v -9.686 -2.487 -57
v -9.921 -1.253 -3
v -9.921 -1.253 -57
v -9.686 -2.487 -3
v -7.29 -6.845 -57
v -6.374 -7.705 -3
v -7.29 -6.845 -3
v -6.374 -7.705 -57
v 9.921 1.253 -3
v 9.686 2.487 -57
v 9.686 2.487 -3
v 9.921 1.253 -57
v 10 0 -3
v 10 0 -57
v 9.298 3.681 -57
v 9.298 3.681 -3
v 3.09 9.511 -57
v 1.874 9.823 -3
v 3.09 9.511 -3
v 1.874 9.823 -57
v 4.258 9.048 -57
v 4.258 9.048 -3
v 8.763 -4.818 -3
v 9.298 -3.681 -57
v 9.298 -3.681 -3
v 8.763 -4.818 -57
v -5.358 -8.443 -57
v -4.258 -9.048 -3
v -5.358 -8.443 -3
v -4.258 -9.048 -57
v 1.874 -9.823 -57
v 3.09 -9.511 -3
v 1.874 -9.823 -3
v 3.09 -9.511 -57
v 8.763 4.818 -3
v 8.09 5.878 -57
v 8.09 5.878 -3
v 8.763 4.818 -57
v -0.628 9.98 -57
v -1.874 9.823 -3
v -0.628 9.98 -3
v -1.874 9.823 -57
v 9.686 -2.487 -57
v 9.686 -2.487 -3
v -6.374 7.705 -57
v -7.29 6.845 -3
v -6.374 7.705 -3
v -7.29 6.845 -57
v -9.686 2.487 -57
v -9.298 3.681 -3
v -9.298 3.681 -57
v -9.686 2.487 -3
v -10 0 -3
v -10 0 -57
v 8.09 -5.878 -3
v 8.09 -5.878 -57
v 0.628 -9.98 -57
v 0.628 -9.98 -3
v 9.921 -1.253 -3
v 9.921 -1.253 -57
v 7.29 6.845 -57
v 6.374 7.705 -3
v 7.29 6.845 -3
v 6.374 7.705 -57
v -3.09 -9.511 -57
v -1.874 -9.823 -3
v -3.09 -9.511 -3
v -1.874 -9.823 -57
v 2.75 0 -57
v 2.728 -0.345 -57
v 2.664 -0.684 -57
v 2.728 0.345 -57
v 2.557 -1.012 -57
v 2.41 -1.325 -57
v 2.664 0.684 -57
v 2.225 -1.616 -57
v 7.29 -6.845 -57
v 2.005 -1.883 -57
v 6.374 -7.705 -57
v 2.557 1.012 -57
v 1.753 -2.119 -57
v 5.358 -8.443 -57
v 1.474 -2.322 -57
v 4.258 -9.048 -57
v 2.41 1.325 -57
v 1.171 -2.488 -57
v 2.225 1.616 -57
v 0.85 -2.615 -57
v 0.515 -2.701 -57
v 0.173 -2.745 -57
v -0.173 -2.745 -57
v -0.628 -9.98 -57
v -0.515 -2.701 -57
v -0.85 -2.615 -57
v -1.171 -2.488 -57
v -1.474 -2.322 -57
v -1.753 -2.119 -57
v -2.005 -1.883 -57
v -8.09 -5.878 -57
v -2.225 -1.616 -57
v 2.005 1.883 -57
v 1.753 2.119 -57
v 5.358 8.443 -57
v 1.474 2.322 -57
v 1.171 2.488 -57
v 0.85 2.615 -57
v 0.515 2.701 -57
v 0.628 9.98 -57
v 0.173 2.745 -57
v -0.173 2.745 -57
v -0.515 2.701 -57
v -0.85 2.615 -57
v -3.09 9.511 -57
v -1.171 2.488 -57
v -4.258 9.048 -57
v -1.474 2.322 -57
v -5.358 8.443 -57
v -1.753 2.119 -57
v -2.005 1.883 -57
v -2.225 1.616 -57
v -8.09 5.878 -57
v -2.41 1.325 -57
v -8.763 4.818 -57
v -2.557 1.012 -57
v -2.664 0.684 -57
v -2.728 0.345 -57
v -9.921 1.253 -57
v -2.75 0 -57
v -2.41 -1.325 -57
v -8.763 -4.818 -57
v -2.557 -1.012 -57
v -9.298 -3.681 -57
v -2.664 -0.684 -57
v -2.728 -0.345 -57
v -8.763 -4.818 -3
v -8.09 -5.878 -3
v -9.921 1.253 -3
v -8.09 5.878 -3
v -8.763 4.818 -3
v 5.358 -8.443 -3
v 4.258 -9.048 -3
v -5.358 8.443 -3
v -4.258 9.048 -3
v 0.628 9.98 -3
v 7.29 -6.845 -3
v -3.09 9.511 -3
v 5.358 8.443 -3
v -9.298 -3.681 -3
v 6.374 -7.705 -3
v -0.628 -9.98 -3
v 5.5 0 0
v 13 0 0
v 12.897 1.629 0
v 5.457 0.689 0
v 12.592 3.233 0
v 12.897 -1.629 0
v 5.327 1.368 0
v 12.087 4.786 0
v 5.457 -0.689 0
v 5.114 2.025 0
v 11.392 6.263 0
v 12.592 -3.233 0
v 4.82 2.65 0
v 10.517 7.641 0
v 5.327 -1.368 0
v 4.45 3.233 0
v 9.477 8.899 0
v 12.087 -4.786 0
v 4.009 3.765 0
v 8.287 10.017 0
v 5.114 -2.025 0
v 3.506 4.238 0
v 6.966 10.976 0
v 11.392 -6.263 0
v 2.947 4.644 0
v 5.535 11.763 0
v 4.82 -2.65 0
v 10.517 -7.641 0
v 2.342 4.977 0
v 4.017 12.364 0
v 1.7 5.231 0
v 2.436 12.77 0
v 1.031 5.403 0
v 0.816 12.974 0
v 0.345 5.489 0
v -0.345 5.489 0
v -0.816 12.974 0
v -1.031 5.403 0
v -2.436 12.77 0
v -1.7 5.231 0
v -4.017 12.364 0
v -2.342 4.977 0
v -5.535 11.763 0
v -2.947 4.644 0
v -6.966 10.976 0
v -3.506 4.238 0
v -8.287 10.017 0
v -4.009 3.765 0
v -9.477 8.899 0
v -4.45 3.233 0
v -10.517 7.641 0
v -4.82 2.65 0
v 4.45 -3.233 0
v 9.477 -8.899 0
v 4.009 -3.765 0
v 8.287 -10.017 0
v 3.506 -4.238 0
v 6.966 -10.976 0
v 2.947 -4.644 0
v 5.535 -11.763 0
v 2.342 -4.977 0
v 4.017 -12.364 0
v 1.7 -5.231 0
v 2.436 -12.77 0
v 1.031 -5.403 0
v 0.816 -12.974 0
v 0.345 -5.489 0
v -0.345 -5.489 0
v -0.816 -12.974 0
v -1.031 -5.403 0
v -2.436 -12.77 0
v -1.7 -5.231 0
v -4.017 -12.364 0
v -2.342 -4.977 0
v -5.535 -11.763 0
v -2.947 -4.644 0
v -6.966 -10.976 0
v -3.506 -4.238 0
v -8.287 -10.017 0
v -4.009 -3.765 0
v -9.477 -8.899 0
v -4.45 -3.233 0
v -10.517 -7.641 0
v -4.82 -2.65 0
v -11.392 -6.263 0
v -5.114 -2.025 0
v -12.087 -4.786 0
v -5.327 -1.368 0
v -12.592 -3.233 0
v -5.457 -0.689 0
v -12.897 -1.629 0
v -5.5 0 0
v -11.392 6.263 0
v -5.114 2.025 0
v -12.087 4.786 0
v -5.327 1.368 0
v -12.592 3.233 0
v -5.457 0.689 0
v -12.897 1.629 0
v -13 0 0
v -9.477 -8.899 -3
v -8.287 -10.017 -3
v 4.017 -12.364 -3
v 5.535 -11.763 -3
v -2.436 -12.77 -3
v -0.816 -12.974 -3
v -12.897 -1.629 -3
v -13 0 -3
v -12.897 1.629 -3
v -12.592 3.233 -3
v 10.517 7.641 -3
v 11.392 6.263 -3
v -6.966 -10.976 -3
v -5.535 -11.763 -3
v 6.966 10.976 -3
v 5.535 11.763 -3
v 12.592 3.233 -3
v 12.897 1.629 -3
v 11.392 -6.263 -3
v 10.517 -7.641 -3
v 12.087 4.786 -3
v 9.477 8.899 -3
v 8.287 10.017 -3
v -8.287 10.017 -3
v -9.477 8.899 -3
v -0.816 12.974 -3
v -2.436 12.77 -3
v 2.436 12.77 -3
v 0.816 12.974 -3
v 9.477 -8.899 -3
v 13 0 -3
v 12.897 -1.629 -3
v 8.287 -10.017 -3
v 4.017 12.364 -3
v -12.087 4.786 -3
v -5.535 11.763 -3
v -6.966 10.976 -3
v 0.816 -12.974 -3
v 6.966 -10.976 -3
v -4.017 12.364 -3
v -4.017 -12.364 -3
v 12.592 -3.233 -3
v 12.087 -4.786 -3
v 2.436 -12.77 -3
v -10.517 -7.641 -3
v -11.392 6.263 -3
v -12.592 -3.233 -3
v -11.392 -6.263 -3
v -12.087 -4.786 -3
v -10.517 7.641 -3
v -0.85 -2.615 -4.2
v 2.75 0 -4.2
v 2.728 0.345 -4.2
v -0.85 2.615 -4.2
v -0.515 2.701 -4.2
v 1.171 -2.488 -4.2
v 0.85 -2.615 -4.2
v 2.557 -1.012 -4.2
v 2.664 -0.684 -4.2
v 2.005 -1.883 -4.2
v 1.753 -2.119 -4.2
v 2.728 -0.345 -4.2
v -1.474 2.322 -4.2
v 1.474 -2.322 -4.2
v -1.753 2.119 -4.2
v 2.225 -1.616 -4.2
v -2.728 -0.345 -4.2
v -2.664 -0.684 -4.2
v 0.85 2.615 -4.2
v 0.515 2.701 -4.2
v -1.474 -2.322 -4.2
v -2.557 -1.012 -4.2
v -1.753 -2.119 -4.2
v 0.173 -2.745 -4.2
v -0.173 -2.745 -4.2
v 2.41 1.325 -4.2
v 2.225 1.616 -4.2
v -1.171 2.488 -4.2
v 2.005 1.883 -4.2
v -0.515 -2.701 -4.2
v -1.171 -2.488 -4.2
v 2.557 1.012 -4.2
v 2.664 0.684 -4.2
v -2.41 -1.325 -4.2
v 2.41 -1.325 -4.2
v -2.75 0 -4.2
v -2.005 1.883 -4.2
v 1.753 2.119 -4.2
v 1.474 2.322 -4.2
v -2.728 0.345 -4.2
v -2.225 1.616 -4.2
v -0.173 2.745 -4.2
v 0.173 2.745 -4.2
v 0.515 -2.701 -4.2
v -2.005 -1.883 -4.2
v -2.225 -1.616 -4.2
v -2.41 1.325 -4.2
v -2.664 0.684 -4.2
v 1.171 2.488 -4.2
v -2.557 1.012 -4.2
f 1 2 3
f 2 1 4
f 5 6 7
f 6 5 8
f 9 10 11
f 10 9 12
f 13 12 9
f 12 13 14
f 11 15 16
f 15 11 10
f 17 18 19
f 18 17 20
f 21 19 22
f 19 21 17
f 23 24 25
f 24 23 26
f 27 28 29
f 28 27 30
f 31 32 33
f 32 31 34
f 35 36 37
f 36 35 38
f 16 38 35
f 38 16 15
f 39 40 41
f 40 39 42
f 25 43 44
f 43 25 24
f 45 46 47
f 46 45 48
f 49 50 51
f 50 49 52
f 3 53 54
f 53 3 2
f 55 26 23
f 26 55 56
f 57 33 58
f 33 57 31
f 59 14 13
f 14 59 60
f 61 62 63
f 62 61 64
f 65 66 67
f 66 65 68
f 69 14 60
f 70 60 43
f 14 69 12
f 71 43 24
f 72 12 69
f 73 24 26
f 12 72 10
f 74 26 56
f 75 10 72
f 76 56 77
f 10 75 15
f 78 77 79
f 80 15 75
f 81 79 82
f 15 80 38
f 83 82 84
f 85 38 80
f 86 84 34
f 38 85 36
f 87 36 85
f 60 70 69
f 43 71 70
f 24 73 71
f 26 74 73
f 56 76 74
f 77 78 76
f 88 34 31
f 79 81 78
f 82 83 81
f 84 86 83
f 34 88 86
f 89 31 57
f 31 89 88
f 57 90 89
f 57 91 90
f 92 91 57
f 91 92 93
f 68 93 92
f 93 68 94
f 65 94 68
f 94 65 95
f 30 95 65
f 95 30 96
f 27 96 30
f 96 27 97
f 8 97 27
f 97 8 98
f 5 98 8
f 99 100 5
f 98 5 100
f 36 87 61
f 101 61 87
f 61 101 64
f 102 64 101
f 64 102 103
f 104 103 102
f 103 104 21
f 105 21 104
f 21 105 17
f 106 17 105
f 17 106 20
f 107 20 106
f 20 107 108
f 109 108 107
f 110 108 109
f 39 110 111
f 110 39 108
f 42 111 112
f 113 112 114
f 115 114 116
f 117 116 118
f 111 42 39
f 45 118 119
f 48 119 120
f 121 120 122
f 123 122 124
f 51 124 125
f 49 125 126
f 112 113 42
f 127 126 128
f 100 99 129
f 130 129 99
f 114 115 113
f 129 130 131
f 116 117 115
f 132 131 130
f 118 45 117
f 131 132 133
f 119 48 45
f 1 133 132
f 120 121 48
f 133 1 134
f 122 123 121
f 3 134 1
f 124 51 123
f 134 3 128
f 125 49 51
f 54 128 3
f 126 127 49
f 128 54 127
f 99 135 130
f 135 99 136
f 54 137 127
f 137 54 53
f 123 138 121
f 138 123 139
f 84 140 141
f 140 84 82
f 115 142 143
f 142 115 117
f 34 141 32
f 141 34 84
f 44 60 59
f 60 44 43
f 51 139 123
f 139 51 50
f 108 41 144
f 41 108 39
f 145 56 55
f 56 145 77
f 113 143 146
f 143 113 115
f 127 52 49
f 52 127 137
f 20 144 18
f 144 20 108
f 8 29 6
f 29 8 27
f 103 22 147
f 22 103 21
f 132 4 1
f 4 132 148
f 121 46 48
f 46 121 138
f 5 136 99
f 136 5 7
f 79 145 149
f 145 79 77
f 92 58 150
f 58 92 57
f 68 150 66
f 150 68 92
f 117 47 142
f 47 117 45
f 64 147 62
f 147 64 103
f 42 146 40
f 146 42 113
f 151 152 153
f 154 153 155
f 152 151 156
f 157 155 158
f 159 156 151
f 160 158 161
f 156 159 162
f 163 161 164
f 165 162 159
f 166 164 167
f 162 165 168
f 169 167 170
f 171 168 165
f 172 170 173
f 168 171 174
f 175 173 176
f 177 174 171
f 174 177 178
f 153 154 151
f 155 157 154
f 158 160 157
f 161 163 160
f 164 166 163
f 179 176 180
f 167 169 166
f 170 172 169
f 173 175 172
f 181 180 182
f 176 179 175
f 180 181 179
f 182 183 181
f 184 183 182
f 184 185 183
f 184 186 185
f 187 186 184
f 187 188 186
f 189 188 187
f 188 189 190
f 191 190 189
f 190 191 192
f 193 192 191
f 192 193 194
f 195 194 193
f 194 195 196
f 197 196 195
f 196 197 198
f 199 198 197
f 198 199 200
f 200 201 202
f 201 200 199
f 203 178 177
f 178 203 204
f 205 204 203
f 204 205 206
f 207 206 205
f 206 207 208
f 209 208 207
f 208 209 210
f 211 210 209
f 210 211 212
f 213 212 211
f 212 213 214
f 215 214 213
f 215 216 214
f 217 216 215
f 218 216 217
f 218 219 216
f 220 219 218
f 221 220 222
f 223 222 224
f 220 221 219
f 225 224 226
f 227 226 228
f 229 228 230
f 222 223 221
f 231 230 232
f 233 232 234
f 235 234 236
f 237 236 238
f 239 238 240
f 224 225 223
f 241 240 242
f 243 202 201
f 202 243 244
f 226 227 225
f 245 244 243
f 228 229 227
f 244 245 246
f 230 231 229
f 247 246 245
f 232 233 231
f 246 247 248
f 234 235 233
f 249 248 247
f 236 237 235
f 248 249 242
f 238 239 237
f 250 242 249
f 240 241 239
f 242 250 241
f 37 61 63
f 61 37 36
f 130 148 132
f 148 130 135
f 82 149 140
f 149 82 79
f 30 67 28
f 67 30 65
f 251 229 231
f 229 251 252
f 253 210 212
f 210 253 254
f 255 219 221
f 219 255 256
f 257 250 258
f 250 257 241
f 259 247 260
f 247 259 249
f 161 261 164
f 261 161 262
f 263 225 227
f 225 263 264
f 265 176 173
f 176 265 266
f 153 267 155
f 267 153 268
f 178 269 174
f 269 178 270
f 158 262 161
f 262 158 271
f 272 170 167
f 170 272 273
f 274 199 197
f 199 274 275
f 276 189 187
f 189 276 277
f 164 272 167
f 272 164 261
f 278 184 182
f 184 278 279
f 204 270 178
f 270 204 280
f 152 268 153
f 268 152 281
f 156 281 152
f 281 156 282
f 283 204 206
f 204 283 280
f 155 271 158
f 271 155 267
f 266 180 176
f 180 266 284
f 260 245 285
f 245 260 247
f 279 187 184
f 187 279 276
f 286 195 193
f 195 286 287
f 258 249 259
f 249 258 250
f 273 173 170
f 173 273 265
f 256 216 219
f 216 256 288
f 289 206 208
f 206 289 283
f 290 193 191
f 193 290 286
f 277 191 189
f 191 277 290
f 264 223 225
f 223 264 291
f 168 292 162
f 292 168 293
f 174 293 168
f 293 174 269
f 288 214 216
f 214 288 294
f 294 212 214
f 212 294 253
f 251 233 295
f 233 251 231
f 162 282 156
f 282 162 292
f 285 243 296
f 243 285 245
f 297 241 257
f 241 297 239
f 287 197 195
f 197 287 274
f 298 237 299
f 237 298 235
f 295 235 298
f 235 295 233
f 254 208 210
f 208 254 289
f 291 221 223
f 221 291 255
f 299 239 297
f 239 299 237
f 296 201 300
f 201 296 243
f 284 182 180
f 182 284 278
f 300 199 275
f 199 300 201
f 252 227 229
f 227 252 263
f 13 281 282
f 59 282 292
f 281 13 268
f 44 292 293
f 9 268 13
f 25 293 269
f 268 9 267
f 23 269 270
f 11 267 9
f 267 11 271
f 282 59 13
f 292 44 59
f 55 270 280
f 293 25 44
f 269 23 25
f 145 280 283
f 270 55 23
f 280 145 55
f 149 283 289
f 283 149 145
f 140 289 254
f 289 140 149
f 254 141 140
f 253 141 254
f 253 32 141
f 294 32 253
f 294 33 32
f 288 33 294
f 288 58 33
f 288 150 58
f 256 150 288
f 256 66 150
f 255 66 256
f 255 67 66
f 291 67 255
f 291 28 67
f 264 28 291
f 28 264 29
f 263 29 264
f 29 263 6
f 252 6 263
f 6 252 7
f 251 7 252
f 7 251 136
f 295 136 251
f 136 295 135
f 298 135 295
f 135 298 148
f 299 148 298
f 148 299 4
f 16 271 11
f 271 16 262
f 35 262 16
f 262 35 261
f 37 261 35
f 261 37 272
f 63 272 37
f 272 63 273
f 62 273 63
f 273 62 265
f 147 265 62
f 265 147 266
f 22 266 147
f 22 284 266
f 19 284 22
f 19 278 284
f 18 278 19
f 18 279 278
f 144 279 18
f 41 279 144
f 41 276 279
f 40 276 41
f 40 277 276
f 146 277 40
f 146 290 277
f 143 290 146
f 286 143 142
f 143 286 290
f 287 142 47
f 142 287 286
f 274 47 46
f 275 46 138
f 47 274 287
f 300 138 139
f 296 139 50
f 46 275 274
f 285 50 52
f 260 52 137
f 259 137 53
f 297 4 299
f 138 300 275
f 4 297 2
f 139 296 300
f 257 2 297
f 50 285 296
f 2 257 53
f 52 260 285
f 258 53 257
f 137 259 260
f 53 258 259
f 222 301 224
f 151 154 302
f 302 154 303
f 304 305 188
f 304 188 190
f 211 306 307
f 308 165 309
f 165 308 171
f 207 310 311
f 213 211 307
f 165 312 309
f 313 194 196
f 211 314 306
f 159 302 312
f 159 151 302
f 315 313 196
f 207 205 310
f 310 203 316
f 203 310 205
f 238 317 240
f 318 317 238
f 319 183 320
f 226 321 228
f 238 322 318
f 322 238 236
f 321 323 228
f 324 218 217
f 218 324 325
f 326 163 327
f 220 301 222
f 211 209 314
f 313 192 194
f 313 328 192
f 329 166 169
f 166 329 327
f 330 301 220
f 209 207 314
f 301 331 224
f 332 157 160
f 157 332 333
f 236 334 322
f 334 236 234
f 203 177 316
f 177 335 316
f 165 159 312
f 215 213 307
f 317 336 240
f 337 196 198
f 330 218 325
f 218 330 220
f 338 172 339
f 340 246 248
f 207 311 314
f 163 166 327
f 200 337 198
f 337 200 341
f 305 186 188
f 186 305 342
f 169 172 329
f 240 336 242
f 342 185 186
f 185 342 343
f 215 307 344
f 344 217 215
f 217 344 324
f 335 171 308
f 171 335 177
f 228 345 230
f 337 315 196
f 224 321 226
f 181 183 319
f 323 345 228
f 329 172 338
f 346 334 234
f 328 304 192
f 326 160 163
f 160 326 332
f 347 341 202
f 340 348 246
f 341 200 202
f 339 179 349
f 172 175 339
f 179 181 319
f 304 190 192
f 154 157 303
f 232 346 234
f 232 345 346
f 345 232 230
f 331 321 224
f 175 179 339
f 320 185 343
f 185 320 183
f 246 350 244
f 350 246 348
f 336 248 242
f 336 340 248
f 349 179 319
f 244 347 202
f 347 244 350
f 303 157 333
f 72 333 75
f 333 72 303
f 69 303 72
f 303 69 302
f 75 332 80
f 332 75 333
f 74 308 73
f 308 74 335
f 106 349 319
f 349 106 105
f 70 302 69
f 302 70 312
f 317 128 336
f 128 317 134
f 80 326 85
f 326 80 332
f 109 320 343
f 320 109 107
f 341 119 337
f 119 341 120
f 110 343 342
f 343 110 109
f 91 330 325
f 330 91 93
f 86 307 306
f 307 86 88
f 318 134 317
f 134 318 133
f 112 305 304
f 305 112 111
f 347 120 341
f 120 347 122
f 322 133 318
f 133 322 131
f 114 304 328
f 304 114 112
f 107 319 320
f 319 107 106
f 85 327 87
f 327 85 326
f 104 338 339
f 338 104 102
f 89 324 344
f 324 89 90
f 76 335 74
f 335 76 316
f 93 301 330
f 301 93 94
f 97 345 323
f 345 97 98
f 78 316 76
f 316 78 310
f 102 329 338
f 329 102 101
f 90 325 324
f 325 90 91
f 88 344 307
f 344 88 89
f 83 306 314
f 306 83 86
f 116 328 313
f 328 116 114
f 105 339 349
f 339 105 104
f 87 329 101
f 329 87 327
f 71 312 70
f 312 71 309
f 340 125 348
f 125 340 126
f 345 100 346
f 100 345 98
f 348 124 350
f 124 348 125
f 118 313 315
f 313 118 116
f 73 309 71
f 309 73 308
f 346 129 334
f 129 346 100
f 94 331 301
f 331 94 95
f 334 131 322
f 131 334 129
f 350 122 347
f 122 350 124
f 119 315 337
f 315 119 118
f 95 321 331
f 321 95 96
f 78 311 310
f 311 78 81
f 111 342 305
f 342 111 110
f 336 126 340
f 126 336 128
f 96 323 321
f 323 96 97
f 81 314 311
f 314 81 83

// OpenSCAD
$fn = 50;


difference() {
	union() {
		translate(v = [0, 0, -57.0000000000]) {
			cylinder(h = 57, r = 10.0000000000);
		}
		translate(v = [0, 0, -3.0000000000]) {
			cylinder(h = 3, r = 13.0000000000);
		}
	}
	union() {
		translate(v = [0, 0, 0]) {
			rotate(a = [0, 0, 0]) {
				difference() {
					union() {
						#translate(v = [0, 0, -57.0000000000]) {
							cylinder(h = 57, r = 2.2500000000);
						}
						#translate(v = [0, 0, -4.2000000000]) {
							cylinder(h = 4.2000000000, r = 10.0000000000, r1 = 2.7500000000, r2 = 5.5000000000);
						}
						#translate(v = [0, 0, -57.0000000000]) {
							cylinder(h = 57, r = 2.7500000000);
						}
						#translate(v = [0, 0, -57.0000000000]) {
							cylinder(h = 57, r = 2.2500000000);
						}
					}
					union();
				}
			}
		}
	}
}
